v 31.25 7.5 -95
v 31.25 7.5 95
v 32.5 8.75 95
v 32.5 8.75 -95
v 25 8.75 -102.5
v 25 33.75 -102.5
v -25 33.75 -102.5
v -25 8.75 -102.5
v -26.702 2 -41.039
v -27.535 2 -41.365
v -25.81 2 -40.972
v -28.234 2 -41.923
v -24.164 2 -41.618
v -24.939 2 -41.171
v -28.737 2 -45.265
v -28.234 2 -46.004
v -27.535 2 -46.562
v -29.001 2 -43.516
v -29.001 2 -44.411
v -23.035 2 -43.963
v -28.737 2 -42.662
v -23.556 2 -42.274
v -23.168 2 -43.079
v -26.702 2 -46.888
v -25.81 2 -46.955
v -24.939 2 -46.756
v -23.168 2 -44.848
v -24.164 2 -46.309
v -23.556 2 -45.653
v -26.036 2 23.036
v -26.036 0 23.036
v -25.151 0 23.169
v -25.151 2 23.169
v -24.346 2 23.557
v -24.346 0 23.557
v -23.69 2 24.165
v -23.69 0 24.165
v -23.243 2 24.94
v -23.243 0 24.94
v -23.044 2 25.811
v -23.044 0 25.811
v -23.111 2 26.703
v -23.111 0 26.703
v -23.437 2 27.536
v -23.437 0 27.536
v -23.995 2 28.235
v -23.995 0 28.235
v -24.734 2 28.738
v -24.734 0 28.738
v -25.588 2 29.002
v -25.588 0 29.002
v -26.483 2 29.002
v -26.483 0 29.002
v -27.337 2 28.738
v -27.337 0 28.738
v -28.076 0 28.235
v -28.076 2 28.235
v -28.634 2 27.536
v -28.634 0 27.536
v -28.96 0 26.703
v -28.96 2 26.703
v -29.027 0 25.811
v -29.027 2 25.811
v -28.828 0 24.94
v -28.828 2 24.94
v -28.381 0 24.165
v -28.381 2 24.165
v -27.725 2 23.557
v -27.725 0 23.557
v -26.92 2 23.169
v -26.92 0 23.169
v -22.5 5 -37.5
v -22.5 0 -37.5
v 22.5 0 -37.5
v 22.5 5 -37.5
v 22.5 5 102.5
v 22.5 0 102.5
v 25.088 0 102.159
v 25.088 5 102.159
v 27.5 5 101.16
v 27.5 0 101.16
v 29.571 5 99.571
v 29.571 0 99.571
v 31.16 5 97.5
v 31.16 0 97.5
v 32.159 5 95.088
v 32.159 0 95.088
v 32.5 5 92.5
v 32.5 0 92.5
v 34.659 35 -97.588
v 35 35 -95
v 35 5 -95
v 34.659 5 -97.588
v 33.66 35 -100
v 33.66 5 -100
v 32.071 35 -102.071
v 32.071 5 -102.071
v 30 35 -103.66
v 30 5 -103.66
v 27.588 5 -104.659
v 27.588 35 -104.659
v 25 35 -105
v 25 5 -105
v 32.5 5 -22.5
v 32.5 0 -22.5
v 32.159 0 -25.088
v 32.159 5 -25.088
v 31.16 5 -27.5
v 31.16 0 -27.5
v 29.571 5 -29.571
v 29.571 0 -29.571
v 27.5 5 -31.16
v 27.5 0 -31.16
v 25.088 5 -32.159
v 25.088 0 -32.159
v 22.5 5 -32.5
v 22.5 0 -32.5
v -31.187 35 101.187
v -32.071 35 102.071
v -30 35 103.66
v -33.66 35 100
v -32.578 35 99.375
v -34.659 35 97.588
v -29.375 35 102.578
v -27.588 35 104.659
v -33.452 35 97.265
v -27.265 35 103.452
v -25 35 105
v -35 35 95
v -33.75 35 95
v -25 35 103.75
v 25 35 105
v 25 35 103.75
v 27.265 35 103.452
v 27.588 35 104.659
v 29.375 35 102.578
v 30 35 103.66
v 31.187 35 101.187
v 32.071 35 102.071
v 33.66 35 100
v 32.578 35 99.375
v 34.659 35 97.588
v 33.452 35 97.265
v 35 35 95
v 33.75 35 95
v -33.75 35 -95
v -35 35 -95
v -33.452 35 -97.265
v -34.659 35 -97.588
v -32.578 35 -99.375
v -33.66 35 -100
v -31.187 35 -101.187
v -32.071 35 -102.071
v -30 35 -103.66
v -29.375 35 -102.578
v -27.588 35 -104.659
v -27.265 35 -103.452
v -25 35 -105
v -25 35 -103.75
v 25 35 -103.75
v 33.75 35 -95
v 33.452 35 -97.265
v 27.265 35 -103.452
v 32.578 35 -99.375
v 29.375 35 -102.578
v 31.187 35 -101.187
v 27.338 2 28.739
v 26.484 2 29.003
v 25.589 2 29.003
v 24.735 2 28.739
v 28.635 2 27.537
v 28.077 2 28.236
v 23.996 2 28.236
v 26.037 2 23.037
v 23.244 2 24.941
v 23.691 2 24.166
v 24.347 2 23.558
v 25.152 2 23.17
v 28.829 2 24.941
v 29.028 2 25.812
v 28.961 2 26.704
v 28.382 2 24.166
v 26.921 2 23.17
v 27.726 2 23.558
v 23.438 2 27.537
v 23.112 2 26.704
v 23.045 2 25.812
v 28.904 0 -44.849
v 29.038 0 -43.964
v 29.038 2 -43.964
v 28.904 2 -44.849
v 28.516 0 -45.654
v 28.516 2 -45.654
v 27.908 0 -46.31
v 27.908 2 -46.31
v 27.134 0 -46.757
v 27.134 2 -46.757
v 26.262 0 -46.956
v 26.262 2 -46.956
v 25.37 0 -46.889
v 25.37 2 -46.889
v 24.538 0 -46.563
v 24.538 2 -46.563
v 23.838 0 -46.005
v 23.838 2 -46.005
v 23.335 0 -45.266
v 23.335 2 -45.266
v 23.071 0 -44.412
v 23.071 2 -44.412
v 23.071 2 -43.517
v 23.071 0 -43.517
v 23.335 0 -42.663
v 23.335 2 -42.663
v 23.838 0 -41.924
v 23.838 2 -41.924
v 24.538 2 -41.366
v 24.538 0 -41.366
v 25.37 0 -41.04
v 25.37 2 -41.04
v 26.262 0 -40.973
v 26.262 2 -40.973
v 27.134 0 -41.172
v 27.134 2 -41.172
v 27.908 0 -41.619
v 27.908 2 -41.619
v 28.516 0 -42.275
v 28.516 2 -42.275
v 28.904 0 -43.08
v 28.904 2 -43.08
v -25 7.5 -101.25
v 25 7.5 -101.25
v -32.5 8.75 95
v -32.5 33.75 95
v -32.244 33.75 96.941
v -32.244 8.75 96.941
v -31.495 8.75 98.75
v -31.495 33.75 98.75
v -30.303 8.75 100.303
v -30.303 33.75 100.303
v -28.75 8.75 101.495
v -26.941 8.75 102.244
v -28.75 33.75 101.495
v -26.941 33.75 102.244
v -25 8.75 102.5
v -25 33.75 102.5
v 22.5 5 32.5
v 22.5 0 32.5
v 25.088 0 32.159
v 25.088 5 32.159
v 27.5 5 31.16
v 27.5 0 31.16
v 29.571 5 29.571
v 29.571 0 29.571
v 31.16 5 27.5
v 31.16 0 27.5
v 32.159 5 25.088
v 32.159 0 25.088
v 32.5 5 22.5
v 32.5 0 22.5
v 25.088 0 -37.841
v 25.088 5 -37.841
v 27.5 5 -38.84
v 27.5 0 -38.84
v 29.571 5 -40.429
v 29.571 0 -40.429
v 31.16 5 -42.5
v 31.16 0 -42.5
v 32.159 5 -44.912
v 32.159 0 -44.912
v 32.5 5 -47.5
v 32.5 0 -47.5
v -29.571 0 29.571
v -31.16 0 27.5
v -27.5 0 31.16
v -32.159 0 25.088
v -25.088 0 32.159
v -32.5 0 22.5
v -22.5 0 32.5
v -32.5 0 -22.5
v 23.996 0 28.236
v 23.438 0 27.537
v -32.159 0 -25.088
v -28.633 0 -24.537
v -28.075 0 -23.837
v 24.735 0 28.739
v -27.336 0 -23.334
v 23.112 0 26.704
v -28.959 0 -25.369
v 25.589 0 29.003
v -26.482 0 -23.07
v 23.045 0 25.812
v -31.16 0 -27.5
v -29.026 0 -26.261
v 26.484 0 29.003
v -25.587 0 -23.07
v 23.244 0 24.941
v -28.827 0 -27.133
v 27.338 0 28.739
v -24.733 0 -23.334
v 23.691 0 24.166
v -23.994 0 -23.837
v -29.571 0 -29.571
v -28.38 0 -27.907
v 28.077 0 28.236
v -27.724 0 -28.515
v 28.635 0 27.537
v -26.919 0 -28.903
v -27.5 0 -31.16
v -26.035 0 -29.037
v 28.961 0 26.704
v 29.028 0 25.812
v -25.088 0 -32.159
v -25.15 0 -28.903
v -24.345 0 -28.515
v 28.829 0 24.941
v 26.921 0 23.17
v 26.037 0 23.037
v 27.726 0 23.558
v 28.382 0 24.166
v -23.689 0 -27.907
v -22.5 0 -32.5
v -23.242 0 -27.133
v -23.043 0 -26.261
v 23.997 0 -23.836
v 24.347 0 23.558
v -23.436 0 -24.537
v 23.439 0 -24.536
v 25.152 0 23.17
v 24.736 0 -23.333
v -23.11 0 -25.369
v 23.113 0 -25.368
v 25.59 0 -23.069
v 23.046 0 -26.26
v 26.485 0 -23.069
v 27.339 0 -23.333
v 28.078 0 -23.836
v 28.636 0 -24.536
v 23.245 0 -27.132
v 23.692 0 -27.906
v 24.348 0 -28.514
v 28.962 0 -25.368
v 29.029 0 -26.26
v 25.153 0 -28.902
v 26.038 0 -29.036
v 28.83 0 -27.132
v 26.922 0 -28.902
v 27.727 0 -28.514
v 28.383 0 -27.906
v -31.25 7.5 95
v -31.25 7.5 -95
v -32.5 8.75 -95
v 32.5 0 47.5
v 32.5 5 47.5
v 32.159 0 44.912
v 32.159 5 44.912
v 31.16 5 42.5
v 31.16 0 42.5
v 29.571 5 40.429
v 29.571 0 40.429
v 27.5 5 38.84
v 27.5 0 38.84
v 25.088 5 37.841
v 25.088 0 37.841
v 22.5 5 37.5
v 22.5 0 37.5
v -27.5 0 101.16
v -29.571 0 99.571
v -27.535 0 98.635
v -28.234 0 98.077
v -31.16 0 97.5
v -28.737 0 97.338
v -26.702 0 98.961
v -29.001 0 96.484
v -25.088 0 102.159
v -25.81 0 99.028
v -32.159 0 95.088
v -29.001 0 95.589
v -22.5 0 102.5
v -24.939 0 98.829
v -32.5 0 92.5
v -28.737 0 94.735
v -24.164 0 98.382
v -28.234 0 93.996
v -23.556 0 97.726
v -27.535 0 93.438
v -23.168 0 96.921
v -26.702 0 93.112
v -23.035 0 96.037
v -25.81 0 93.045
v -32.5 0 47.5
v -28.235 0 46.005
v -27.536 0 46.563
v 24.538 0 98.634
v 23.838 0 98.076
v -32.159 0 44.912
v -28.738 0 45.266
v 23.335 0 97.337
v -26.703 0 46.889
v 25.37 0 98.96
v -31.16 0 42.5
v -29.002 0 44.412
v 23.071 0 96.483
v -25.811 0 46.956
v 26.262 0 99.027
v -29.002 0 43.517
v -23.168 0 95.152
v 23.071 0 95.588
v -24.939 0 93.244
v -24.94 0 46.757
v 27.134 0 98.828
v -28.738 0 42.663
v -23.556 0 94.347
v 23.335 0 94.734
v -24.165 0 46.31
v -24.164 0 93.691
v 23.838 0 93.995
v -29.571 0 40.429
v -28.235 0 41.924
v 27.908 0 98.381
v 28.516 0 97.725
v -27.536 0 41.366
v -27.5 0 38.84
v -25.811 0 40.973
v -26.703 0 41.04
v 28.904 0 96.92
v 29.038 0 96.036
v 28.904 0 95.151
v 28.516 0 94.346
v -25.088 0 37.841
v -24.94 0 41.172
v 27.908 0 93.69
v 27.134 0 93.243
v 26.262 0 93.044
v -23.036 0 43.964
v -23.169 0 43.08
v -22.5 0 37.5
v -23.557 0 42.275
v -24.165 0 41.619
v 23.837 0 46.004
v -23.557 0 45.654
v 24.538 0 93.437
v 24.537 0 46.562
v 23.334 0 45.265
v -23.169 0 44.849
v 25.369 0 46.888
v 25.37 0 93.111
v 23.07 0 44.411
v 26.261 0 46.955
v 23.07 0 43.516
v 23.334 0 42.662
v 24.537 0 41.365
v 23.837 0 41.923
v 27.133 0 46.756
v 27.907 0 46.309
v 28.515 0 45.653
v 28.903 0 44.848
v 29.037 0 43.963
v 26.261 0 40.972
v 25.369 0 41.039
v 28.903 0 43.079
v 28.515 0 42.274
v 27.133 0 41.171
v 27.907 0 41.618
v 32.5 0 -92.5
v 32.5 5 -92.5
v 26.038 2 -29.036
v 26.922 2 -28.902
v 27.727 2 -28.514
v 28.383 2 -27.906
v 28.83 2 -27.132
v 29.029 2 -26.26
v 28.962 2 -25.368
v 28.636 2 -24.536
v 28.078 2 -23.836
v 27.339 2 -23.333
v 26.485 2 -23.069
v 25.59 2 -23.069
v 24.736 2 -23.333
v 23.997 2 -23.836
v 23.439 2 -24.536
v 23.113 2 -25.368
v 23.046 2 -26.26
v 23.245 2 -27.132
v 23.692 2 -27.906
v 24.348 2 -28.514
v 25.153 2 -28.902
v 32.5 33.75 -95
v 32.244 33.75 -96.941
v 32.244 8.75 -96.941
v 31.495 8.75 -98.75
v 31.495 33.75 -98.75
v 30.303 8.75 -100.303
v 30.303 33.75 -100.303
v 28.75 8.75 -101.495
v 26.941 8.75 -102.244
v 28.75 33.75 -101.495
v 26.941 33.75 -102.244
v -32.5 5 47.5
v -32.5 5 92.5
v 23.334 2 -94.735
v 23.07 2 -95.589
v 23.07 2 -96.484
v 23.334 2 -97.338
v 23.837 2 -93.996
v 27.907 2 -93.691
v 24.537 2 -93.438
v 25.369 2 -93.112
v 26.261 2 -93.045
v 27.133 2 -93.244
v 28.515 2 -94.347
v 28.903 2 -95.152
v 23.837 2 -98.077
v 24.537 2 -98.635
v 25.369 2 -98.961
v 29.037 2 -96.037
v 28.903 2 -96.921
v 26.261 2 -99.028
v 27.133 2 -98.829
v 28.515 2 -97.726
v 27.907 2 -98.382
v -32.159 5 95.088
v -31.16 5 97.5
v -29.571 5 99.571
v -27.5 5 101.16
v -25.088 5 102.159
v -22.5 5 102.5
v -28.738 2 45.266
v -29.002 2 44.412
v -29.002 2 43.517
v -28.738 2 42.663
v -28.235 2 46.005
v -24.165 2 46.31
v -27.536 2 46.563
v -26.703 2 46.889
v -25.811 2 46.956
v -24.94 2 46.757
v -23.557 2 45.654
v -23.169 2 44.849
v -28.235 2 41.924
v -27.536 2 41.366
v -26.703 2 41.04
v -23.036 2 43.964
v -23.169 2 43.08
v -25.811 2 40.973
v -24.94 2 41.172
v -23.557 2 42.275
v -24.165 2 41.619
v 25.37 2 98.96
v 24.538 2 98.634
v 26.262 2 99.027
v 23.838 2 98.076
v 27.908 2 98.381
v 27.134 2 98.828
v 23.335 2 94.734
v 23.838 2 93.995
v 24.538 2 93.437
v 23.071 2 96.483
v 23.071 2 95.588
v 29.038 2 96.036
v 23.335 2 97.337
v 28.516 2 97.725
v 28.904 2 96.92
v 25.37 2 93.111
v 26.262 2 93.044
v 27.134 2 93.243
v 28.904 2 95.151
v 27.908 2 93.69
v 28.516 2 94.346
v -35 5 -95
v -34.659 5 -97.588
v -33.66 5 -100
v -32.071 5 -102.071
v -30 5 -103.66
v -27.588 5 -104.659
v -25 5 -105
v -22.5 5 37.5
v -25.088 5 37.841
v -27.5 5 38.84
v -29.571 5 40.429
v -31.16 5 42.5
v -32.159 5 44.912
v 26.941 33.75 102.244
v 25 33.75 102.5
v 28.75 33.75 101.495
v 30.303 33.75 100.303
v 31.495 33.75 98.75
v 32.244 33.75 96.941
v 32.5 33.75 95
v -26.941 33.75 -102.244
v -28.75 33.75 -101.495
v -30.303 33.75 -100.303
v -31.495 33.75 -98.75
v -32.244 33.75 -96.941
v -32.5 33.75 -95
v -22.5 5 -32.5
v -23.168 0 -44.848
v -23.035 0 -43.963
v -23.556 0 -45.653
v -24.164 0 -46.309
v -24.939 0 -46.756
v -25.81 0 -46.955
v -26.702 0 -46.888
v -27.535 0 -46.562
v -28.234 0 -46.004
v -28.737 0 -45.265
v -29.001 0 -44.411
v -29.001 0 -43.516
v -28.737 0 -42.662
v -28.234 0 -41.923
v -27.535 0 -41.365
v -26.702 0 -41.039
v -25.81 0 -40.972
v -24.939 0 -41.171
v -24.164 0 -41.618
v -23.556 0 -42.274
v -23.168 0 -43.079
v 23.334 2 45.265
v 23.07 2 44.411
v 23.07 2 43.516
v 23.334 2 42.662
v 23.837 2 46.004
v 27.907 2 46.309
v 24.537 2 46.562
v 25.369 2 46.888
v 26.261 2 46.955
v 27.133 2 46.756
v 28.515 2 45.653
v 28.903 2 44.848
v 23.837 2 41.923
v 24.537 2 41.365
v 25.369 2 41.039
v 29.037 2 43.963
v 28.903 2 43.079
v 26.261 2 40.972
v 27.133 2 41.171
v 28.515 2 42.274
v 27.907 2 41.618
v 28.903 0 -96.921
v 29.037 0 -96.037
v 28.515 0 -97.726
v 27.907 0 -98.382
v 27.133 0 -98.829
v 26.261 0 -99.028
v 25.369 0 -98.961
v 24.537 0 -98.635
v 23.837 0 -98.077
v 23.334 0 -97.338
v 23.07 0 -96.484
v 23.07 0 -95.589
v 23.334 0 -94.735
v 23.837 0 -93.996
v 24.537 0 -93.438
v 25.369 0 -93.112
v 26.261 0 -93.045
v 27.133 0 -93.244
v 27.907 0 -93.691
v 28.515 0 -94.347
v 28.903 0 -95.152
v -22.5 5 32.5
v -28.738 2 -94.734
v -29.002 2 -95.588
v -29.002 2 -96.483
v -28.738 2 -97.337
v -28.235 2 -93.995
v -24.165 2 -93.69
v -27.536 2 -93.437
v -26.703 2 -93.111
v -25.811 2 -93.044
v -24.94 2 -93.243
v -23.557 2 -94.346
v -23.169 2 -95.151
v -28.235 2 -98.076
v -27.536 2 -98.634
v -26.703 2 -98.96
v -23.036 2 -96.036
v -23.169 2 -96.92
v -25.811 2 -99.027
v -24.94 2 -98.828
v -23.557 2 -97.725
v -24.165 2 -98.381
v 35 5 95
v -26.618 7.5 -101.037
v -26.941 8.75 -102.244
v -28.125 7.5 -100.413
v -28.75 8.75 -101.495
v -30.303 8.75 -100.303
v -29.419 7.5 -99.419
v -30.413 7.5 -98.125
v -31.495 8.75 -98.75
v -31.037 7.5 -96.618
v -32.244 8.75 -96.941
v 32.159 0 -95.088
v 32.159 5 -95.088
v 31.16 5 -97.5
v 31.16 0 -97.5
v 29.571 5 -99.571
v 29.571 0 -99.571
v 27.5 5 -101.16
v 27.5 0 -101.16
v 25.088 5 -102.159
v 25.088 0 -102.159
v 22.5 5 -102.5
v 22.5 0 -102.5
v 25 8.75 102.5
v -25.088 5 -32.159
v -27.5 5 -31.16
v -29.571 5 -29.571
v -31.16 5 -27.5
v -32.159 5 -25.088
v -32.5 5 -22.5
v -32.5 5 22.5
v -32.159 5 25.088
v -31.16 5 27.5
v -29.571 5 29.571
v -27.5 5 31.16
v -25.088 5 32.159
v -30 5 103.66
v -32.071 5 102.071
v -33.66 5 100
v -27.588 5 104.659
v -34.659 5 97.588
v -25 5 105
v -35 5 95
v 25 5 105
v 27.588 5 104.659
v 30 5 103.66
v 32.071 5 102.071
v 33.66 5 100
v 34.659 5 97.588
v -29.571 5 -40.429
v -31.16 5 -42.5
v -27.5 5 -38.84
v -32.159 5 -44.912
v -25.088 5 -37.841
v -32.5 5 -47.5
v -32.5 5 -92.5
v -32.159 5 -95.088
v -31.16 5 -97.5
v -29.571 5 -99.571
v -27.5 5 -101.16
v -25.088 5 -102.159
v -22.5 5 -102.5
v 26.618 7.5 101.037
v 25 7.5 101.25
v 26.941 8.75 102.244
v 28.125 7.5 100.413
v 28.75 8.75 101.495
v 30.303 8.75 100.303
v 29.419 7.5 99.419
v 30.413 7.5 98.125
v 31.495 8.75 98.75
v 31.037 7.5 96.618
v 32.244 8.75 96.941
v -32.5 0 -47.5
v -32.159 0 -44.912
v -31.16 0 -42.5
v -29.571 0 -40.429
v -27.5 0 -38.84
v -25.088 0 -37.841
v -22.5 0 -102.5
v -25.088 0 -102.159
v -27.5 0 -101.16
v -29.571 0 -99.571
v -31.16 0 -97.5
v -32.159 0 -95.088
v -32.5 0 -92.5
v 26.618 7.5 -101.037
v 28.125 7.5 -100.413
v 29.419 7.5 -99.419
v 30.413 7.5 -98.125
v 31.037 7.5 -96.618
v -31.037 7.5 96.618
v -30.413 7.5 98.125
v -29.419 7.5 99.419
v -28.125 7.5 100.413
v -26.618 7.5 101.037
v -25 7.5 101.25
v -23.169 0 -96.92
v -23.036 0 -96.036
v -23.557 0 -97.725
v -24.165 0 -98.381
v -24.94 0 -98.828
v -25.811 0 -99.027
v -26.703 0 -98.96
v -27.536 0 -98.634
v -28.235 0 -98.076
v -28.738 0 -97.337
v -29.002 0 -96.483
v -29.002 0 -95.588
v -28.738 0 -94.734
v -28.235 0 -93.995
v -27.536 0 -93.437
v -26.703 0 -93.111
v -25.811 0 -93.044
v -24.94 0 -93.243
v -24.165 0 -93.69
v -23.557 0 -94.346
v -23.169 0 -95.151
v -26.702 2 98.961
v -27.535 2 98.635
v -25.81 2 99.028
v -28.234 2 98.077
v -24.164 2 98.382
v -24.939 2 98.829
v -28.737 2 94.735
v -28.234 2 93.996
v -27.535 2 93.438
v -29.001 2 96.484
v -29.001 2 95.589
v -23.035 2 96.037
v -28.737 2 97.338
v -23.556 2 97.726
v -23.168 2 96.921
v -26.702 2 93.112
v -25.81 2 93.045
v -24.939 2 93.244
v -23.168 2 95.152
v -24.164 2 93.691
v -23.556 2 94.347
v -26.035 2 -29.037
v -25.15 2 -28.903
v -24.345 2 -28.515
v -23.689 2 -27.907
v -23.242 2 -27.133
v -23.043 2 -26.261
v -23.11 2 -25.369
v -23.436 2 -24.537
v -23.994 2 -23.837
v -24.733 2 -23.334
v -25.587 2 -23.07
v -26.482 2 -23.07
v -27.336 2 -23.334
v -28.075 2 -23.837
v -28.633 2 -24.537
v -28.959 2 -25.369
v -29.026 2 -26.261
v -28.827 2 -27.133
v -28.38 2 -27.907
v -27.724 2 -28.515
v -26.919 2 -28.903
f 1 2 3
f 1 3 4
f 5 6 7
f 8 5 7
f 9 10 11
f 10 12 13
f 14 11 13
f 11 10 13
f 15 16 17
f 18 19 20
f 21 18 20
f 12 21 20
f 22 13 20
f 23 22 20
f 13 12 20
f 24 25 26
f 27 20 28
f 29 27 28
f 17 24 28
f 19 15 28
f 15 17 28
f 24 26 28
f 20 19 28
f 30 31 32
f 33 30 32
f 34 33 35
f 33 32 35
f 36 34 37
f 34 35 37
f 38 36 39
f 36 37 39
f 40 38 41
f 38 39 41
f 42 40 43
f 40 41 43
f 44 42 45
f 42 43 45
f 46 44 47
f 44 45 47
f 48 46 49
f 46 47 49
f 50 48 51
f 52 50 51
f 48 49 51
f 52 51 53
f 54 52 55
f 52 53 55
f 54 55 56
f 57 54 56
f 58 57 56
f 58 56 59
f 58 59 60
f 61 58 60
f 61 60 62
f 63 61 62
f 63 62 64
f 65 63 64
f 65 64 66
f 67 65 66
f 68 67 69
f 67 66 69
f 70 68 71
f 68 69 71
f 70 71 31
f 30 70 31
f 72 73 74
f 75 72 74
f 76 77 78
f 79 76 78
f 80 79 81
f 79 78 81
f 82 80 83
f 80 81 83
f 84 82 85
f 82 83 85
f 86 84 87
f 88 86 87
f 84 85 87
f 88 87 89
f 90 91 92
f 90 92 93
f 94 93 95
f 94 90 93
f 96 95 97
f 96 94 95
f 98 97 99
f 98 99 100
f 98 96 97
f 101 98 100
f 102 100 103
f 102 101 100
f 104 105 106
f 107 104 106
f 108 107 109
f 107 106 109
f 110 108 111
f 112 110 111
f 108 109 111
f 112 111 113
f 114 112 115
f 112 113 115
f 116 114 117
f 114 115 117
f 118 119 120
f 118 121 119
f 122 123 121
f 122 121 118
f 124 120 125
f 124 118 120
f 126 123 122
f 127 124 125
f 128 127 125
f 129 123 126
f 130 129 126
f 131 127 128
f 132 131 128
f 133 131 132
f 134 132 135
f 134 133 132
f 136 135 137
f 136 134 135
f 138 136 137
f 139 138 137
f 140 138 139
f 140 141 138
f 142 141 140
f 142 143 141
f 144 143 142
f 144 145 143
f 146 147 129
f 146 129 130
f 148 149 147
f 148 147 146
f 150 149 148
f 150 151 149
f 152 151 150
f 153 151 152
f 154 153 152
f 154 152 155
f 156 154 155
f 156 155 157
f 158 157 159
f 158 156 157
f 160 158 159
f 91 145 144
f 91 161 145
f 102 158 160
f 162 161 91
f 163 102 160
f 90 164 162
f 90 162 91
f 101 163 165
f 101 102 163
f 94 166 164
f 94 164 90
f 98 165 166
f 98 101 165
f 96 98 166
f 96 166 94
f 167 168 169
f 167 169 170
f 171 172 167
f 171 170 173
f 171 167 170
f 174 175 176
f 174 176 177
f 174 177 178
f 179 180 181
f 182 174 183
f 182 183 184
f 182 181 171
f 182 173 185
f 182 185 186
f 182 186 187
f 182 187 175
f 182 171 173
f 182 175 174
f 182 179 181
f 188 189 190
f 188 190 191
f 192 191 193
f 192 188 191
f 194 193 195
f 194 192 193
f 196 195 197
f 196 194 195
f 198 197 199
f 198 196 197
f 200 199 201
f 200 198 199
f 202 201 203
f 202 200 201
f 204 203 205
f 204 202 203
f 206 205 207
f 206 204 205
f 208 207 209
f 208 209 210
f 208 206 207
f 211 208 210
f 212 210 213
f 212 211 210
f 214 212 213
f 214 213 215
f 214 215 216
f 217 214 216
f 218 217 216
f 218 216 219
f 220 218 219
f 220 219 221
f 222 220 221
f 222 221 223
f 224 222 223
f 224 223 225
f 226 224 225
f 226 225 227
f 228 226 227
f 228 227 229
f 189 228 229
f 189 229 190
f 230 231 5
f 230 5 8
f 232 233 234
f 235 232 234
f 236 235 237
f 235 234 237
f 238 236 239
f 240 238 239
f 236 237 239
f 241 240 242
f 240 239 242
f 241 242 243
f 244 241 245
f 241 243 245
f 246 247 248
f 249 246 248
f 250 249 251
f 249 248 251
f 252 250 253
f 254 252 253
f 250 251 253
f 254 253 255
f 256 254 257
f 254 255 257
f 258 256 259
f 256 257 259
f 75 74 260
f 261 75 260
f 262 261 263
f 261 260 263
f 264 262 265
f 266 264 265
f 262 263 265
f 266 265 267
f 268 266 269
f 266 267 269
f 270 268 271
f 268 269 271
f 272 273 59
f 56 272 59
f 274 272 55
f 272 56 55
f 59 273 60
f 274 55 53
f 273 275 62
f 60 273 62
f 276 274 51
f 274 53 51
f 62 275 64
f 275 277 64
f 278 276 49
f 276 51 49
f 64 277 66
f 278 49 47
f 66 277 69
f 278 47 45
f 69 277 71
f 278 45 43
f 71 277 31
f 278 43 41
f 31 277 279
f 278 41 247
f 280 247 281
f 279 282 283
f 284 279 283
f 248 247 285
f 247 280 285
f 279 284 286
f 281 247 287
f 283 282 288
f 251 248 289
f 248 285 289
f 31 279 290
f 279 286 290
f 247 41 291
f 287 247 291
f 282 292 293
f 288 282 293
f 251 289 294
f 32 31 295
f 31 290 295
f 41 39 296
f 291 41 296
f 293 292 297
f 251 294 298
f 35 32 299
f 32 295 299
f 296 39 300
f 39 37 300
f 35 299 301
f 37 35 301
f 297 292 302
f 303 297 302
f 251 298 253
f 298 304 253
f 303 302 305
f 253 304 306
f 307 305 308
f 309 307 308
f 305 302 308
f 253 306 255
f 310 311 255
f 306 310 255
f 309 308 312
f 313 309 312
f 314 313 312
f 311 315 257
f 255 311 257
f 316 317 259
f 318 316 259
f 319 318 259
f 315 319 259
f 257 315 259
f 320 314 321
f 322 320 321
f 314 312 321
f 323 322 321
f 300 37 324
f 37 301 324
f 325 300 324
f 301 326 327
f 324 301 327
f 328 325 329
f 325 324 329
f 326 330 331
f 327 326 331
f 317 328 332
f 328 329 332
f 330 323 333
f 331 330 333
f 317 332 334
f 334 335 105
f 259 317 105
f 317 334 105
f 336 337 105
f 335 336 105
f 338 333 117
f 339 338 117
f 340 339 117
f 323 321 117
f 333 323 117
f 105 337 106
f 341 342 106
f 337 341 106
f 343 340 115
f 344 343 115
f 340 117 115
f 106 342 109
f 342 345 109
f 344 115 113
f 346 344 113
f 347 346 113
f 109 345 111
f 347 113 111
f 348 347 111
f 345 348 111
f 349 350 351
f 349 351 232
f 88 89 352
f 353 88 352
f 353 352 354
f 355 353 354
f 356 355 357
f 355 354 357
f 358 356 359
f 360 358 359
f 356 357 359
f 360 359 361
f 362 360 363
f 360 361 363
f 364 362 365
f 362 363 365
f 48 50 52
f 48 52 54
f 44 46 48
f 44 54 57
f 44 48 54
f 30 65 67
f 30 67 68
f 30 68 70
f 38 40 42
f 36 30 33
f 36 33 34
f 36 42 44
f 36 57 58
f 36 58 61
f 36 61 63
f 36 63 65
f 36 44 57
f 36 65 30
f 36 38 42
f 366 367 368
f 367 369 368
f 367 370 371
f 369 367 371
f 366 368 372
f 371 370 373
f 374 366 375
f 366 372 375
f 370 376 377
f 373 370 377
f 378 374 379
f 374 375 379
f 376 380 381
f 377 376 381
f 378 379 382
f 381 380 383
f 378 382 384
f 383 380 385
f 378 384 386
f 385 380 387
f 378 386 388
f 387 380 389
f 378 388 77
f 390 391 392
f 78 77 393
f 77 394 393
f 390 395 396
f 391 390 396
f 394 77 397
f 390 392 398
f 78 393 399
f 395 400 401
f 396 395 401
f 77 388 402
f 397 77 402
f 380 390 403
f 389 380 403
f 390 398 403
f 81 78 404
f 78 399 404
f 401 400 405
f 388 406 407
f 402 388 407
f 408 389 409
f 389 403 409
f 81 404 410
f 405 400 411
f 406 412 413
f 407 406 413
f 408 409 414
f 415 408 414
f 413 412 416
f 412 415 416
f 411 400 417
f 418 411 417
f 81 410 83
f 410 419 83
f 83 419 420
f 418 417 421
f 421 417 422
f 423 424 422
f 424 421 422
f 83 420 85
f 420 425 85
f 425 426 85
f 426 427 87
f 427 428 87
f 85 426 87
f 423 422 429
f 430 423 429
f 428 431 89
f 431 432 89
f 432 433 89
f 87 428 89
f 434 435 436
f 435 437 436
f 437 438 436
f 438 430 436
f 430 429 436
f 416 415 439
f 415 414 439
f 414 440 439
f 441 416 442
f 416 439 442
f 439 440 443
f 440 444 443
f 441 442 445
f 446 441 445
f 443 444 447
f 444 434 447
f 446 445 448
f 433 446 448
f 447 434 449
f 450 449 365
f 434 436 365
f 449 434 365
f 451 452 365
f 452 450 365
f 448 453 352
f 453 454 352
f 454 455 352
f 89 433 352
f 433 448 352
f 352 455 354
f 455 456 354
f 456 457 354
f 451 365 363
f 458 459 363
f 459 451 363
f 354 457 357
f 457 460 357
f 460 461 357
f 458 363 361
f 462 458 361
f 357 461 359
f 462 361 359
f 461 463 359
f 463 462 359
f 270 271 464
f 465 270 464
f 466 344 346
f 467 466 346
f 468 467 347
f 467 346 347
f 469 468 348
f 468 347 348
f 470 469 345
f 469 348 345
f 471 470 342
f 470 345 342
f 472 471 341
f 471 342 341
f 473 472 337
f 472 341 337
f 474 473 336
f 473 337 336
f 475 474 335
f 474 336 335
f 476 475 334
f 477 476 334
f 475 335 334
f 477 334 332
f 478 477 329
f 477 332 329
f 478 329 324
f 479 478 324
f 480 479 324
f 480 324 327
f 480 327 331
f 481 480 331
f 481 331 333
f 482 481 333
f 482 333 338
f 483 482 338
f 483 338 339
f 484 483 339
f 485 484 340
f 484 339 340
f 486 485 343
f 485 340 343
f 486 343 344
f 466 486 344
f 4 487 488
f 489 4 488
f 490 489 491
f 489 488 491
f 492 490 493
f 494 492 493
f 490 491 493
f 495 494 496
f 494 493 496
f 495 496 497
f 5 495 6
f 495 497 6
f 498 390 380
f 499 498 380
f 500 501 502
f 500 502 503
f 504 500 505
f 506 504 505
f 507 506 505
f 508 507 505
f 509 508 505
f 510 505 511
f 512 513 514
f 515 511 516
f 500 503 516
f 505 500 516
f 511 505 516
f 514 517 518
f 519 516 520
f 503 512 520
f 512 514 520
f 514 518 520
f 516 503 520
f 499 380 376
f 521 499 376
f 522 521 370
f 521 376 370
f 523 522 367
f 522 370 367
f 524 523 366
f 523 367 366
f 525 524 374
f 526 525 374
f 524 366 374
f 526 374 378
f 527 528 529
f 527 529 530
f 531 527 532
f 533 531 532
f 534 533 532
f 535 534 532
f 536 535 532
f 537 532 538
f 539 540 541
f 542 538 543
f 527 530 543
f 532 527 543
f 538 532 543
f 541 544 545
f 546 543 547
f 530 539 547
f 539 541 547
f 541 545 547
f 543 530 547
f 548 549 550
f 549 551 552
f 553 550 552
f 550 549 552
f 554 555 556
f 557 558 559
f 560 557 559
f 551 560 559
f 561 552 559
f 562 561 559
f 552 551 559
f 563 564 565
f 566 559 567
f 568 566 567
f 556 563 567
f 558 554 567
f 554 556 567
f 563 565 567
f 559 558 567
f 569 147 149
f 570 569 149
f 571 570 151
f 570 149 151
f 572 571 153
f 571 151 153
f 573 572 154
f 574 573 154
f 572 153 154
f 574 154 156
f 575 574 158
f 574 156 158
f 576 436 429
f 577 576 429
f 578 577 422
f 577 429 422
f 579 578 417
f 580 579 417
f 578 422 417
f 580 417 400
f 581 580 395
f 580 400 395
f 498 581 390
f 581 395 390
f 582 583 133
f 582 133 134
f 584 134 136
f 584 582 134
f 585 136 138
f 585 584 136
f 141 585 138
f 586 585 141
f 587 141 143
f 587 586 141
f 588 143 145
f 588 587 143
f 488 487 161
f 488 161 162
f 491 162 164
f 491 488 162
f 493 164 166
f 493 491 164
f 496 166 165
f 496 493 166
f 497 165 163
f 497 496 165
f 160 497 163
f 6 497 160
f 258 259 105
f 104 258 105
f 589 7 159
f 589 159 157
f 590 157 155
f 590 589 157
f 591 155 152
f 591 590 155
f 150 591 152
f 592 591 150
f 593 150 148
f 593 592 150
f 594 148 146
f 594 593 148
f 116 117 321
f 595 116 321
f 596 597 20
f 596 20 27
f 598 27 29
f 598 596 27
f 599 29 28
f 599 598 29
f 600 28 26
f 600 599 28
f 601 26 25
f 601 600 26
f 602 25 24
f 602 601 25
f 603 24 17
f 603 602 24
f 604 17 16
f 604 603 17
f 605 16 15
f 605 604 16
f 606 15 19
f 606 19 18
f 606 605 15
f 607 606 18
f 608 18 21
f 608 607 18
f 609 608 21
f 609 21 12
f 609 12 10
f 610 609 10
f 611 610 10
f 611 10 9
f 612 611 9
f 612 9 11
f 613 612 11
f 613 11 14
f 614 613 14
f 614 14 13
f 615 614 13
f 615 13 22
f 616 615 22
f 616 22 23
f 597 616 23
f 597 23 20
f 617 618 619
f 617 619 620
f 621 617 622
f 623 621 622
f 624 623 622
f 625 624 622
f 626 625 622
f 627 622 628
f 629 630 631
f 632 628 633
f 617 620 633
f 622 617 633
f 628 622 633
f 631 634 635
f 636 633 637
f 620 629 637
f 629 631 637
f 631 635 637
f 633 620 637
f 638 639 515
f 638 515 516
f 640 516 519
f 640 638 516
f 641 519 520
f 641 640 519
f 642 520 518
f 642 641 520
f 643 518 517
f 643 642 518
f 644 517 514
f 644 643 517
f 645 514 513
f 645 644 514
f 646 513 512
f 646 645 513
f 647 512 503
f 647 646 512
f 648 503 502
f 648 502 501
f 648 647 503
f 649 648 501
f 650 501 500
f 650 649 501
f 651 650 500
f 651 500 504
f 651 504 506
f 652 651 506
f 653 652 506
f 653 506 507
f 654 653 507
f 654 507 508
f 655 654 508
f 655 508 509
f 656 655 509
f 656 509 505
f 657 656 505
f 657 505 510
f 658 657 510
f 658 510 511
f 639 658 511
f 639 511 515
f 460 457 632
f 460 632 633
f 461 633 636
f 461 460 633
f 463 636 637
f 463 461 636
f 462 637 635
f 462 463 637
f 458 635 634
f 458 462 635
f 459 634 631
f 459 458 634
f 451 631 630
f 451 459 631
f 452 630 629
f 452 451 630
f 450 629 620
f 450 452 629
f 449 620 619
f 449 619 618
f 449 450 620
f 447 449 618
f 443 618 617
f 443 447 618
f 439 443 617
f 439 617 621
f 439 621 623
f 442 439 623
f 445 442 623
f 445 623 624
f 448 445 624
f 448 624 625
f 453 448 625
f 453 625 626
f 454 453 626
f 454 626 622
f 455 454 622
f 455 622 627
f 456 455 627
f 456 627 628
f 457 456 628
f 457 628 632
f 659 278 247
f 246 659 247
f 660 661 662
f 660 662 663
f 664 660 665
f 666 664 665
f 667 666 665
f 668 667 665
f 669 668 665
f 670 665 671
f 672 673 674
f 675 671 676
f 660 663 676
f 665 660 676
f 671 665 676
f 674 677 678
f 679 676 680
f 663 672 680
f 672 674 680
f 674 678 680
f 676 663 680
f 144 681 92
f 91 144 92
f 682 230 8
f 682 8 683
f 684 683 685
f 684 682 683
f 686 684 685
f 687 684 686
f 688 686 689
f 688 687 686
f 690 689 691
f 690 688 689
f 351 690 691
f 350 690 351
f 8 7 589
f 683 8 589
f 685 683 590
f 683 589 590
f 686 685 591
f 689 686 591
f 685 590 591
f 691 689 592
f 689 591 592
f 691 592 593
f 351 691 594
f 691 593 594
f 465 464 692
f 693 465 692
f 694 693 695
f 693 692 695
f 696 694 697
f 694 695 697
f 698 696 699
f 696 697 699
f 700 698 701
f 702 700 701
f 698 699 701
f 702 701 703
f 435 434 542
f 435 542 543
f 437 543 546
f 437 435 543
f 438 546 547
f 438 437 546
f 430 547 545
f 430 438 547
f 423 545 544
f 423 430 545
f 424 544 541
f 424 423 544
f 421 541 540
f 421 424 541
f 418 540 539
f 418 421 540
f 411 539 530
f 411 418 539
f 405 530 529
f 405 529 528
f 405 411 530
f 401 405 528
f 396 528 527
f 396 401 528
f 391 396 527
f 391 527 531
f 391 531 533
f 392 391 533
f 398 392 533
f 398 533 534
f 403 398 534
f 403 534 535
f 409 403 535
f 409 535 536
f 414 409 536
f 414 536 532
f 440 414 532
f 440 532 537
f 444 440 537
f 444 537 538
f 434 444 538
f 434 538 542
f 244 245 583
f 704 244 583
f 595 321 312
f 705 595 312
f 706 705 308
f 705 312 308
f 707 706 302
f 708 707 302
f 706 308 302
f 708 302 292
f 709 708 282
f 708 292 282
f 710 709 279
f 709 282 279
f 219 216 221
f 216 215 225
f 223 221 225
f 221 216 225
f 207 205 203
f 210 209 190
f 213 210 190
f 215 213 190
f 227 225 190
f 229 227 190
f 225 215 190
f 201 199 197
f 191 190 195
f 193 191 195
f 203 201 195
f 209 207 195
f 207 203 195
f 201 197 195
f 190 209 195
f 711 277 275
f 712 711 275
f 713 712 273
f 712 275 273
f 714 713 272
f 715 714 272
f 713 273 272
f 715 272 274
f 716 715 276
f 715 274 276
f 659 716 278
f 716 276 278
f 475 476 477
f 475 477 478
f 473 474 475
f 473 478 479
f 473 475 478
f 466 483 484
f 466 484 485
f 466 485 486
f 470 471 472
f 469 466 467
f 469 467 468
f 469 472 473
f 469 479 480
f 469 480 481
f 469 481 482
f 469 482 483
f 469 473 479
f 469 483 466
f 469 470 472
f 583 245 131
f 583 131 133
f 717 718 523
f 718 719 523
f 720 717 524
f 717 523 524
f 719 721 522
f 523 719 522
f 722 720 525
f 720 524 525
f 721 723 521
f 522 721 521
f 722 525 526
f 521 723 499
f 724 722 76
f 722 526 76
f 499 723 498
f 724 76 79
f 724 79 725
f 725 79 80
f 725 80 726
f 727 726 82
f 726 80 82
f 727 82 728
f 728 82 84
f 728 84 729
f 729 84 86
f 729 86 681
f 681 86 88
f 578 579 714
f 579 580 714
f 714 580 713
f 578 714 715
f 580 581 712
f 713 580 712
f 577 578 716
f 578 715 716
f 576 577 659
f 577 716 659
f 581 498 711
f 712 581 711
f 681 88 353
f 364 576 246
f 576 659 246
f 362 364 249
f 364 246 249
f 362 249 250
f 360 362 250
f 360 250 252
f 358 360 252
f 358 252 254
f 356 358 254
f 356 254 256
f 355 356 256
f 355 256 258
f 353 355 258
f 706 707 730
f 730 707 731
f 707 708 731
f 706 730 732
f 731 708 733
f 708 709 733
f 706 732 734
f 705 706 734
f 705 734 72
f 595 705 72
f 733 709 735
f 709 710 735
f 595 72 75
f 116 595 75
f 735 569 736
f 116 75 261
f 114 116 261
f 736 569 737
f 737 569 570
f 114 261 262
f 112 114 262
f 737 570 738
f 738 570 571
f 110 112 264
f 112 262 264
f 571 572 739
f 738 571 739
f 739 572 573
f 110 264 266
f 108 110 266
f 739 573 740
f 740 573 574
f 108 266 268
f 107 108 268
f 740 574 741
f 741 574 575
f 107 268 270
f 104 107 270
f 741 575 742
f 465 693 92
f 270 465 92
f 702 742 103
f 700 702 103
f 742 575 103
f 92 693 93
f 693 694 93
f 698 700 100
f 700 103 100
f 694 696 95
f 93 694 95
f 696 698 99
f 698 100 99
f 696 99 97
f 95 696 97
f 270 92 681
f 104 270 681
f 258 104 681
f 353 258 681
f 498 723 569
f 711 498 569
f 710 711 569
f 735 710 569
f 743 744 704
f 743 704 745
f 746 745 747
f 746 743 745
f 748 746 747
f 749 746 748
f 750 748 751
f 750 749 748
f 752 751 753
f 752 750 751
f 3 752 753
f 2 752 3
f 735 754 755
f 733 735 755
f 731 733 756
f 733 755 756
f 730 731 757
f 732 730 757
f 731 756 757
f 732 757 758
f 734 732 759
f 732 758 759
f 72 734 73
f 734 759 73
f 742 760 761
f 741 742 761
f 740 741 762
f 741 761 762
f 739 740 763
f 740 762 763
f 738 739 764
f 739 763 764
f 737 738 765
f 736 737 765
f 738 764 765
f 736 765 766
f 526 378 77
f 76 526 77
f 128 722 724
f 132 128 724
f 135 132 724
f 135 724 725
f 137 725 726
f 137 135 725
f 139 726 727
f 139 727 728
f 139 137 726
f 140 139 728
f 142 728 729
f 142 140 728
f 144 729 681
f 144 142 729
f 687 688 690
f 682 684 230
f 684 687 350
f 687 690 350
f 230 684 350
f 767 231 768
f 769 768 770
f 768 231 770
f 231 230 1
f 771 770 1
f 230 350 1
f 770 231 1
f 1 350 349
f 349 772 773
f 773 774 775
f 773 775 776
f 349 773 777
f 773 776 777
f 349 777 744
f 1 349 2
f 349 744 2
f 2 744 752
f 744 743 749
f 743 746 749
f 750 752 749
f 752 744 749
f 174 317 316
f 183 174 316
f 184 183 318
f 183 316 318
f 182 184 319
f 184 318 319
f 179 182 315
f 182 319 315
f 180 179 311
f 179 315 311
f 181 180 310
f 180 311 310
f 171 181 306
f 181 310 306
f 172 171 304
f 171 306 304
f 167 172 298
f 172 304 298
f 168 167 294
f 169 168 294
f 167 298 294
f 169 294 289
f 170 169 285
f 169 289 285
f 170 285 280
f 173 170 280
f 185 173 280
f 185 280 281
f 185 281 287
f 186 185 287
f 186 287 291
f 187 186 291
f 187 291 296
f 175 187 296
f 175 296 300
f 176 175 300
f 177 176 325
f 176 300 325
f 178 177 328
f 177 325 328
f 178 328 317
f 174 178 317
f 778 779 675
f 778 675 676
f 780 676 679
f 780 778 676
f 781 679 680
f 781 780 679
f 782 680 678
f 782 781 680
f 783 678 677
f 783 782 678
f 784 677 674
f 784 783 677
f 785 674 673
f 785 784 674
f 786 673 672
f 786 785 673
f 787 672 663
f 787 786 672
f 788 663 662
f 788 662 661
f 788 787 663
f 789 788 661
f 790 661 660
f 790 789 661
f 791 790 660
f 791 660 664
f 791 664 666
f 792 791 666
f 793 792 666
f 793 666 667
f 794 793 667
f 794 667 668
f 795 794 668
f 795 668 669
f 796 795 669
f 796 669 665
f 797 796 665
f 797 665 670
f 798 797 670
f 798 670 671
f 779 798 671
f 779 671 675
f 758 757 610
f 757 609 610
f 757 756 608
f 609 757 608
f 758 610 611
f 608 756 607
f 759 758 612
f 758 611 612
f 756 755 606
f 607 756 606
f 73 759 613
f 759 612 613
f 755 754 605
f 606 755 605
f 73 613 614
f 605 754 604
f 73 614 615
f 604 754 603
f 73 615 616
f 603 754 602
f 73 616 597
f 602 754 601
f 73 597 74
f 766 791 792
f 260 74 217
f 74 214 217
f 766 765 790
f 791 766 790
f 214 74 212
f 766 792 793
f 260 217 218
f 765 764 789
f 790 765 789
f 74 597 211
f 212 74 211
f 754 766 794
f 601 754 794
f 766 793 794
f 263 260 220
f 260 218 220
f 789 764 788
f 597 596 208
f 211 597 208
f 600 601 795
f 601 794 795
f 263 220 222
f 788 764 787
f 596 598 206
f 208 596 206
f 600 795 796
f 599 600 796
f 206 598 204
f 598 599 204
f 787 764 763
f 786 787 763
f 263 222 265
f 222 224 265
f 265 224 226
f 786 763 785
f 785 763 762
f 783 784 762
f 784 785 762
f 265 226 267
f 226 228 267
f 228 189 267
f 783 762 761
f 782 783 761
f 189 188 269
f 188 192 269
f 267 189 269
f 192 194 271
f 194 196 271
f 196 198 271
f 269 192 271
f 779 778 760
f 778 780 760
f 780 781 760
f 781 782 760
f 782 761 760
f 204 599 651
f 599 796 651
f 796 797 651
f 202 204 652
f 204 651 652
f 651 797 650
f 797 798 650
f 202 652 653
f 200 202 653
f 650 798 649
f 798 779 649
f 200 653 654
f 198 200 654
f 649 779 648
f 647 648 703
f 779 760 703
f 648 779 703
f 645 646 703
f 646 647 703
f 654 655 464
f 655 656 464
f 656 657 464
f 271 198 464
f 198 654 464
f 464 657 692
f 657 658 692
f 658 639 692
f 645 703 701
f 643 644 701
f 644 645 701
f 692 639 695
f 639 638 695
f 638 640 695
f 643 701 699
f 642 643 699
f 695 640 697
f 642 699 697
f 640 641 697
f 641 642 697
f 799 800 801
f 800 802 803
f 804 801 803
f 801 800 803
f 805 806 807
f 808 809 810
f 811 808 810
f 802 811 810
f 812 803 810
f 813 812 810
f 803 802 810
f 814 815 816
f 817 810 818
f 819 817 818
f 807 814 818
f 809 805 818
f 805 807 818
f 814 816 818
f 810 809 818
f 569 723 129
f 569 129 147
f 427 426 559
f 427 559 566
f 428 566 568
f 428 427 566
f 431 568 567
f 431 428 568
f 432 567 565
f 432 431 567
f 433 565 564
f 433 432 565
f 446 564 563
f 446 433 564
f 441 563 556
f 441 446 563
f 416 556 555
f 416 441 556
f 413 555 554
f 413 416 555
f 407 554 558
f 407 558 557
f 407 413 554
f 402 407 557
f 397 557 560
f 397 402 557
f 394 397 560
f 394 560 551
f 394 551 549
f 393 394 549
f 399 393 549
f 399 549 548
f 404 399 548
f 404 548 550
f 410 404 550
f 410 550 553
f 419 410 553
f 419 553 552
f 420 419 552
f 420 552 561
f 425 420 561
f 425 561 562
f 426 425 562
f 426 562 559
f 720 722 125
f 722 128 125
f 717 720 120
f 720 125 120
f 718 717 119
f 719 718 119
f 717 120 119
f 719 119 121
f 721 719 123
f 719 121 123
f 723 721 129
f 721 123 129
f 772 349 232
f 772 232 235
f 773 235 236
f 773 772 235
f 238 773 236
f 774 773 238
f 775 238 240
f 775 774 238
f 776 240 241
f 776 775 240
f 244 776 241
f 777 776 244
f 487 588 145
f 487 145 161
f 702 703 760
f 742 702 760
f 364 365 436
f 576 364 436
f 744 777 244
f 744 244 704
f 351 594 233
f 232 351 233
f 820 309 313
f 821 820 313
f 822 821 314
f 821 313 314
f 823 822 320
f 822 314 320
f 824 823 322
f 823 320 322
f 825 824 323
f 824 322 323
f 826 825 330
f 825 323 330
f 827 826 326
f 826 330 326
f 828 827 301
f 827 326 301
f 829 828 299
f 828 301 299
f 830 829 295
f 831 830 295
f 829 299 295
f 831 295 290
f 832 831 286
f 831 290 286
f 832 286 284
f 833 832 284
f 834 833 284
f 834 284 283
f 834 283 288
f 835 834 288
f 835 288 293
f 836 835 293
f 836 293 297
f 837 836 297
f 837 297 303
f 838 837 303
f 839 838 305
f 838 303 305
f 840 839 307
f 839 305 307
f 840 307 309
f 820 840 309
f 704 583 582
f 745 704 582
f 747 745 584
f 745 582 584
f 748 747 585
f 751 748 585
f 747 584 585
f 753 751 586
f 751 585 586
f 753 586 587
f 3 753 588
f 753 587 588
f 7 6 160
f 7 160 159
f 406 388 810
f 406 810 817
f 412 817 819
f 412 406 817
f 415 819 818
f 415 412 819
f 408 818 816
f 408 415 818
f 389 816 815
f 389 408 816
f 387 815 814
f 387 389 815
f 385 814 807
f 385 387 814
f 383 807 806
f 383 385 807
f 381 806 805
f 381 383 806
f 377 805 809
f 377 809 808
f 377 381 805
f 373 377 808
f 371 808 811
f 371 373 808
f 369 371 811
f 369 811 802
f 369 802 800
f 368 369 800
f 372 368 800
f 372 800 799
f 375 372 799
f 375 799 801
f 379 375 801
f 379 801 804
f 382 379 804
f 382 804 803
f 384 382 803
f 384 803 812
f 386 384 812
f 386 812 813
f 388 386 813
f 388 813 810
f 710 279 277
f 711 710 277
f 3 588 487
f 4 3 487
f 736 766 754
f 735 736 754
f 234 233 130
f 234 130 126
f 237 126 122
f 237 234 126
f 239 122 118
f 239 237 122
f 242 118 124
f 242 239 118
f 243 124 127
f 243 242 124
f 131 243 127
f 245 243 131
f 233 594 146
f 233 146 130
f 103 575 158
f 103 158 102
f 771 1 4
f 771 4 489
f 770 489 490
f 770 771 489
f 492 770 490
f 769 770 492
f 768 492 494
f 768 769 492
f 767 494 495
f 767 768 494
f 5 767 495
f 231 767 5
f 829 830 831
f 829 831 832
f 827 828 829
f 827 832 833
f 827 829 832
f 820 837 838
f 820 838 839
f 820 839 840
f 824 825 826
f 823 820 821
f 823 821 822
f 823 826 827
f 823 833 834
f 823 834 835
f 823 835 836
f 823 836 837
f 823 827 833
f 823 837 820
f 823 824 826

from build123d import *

# Parameters (mm, degrees)
BOSS_EXTRUDE4_DEPTH = 5
SKETCH7_R           = 3
CUT_EXTRUDE4_DEPTH  = 2
SKETCH8_W           = 70
SKETCH8_H           = 70
BOSS_EXTRUDE5_DEPTH = 30
MIRROR2_START       = 5
MIRROR2_OUTLINE_W   = 70
MIRROR2_OUTLINE_H   = 70
MIRROR2_DEPTH       = 30
MIRROR2_2_OUTLINE_R = 3
MIRROR2_2_DEPTH     = 5
MIRROR2_START_2     = 2
MIRROR2_3_OUTLINE_R = 3
MIRROR2_3_DEPTH     = 3
FILLET1_R           = 10
CUT_EXTRUDE5_DEPTH  = 30
BOSS_EXTRUDE6_DEPTH = 2.5
CHAMFER1_SIZE       = 1.25


# Read off the part's stored shape, not the designer's step: Mirror2
with BuildPart() as part:
    # Sketch5 → Boss-Extrude4 (new body)
    with BuildSketch(Plane(origin=(0, 0, 0), x_dir=(1, 0, 0), z_dir=(0, 1, 0))):
        with BuildLine():
            Line((-22.5, -32.5), (22.5, -32.5))
            ThreePointArc((22.5, -32.5), (29.571067812, -29.571067812), (32.5, -22.5))
            Line((32.5, -22.5), (32.5, 22.5))
            ThreePointArc((32.5, 22.5), (29.571067812, 29.571067812), (22.5, 32.5))
            Line((22.5, 32.5), (-22.5, 32.5))
            ThreePointArc((-22.5, 32.5), (-29.571067812, 29.571067812), (-32.5, 22.5))
            Line((-32.5, 22.5), (-32.5, -22.5))
            ThreePointArc((-32.5, -22.5), (-29.571067812, -29.571067812), (-22.5, -32.5))
        make_face()
    extrude(amount=BOSS_EXTRUDE4_DEPTH)

    # Sketch7 → Cut-Extrude4 (cut)
    with BuildSketch(Plane.XZ):
        with Locations(Location((-26.035533906, 26.035533906, 0), (0, 0, 270))):
            Circle(SKETCH7_R)
        with Locations(Location((26.036533906, 26.036533906, 0), (0, 0, 270))):
            Circle(SKETCH7_R)
        with Locations(Location((26.037533906, -26.035533906, 0), (0, 0, 270))):
            Circle(SKETCH7_R)
        with Locations(Location((-26.034533906, -26.036533906, 0), (0, 0, 270))):
            Circle(SKETCH7_R)
    extrude(amount=-CUT_EXTRUDE4_DEPTH, mode=Mode.SUBTRACT)

    # Sketch8 → Boss-Extrude5 (add)
    with BuildSketch(Plane(origin=(0, 5, 0), x_dir=(1, 0, 0), z_dir=(0, 1, 0))):
        Rectangle(SKETCH8_W, SKETCH8_H)
    extrude(amount=BOSS_EXTRUDE5_DEPTH)

    # Mirror2 outline → Mirror2 (add)
    with BuildSketch(Plane(origin=(0, 0, 0), x_dir=(1, 0, 0), z_dir=(0, 1, 0)).offset(MIRROR2_START)):
        with Locations((0, -70)):
            Rectangle(MIRROR2_OUTLINE_W, MIRROR2_OUTLINE_H)
        with Locations((0, 70)):
            Rectangle(MIRROR2_OUTLINE_W, MIRROR2_OUTLINE_H)
    extrude(amount=MIRROR2_DEPTH)

    # Mirror2 2 outline → Mirror2 2 (add)
    # profile 1 of 2: a face of its own
    with BuildSketch(Plane(origin=(0, 0, 0), x_dir=(1, 0, 0), z_dir=(0, 1, 0))):
        with BuildLine():
            Line((32.5, -92.5), (32.5, -47.5))
            ThreePointArc((32.5, -47.5), (29.571067812, -40.428932188), (22.5, -37.5))
            Line((22.5, -37.5), (-22.5, -37.5))
            ThreePointArc((-22.5, -37.5), (-29.571067812, -40.428932188), (-32.5, -47.5))
            Line((-32.5, -47.5), (-32.5, -92.5))
            ThreePointArc((-32.5, -92.5), (-29.571067812, -99.571067812), (-22.5, -102.5))
            Line((-22.5, -102.5), (22.5, -102.5))
            ThreePointArc((22.5, -102.5), (29.571067812, -99.571067812), (32.5, -92.5))
        make_face()
        with Locations((-26.034533906, -96.036533906)):
            Circle(MIRROR2_2_OUTLINE_R, mode=Mode.SUBTRACT)
        with Locations((-26.035533906, -43.964466094)):
            Circle(MIRROR2_2_OUTLINE_R, mode=Mode.SUBTRACT)
        with Locations((26.037533906, -96.035533906)):
            Circle(MIRROR2_2_OUTLINE_R, mode=Mode.SUBTRACT)
        with Locations((26.036533906, -43.963466094)):
            Circle(MIRROR2_2_OUTLINE_R, mode=Mode.SUBTRACT)
    # profile 2 of 2: a face of its own
    with BuildSketch(Plane(origin=(0, 0, 0), x_dir=(1, 0, 0), z_dir=(0, 1, 0))):
        with BuildLine():
            Line((32.5, 47.5), (32.5, 92.5))
            ThreePointArc((32.5, 92.5), (29.571067812, 99.571067812), (22.5, 102.5))
            Line((22.5, 102.5), (-22.5, 102.5))
            ThreePointArc((-22.5, 102.5), (-29.571067812, 99.571067812), (-32.5, 92.5))
            Line((-32.5, 92.5), (-32.5, 47.5))
            ThreePointArc((-32.5, 47.5), (-29.571067812, 40.428932188), (-22.5, 37.5))
            Line((-22.5, 37.5), (22.5, 37.5))
            ThreePointArc((22.5, 37.5), (29.571067812, 40.428932188), (32.5, 47.5))
        make_face()
        with Locations((-26.034533906, 43.963466094)):
            Circle(MIRROR2_2_OUTLINE_R, mode=Mode.SUBTRACT)
        with Locations((-26.035533906, 96.035533906)):
            Circle(MIRROR2_2_OUTLINE_R, mode=Mode.SUBTRACT)
        with Locations((26.037533906, 43.964466094)):
            Circle(MIRROR2_2_OUTLINE_R, mode=Mode.SUBTRACT)
        with Locations((26.036533906, 96.036533906)):
            Circle(MIRROR2_2_OUTLINE_R, mode=Mode.SUBTRACT)
    extrude(amount=MIRROR2_2_DEPTH)

    # Mirror2 3 outline → Mirror2 3 (add)
    with BuildSketch(Plane(origin=(0, 0, 0), x_dir=(1, 0, 0), z_dir=(0, 1, 0)).offset(MIRROR2_START_2)):
        with Locations((-26.035533906, -43.964466094)):
            Circle(MIRROR2_3_OUTLINE_R)
        with Locations((26.036533906, -43.963466094)):
            Circle(MIRROR2_3_OUTLINE_R)
        with Locations((26.037533906, -96.035533906)):
            Circle(MIRROR2_3_OUTLINE_R)
        with Locations((-26.034533906, -96.036533906)):
            Circle(MIRROR2_3_OUTLINE_R)
        with Locations((-26.035533906, 96.035533906)):
            Circle(MIRROR2_3_OUTLINE_R)
        with Locations((26.036533906, 96.036533906)):
            Circle(MIRROR2_3_OUTLINE_R)
        with Locations((26.037533906, 43.964466094)):
            Circle(MIRROR2_3_OUTLINE_R)
        with Locations((-26.034533906, 43.963466094)):
            Circle(MIRROR2_3_OUTLINE_R)
    extrude(amount=MIRROR2_3_DEPTH)

    # Fillet1
    fillet1_edges = [part.edges().sort_by_distance(p)[0] for p in [
        (35, 20, 105),
        (-35, 20, 105),
        (-35, 20, -105),
        (35, 20, -105),
    ]]
    fillet(fillet1_edges, radius=FILLET1_R)

    # Sketch9 → Cut-Extrude5 (cut)
    with BuildSketch(Plane(origin=(0, 35, 0), x_dir=(1, 0, 0), z_dir=(0, 1, 0))):
        with BuildLine():
            Line((-32.5, 95), (-32.5, -95))
            ThreePointArc((-32.5, -95), (-30.303300859, -100.303300859), (-25, -102.5))
            Line((-25, -102.5), (25, -102.5))
            ThreePointArc((25, -102.5), (30.303300859, -100.303300859), (32.5, -95))
            Line((32.5, -95), (32.5, 95))
            ThreePointArc((32.5, 95), (30.303300859, 100.303300859), (25, 102.5))
            Line((25, 102.5), (-25, 102.5))
            ThreePointArc((-25, 102.5), (-30.303300859, 100.303300859), (-32.5, 95))
        make_face()
    extrude(amount=-CUT_EXTRUDE5_DEPTH, mode=Mode.SUBTRACT)


with BuildPart() as cut_extrude5_piece_1:
    # of the separate pieces the step leaves, piece 1, a body of its own (cut_extrude5_pieces)
    add(part.part.solids().sort_by_distance((35, 5, 95))[0])



with BuildPart() as cut_extrude5_piece_2:
    # of the separate pieces the step leaves, piece 2, a body of its own (cut_extrude5_pieces)
    add(part.part.solids().sort_by_distance((32.5, 0, 92.5))[0])


with BuildPart() as cut_extrude5_piece_3:
    # of the separate pieces the step leaves, piece 3, a body of its own (cut_extrude5_pieces)
    add(part.part.solids().sort_by_distance((32.5, 0, -47.5))[0])


with BuildPart() as cut_extrude5_piece_4:
    # of the separate pieces the step leaves, piece 4, a body of its own (cut_extrude5_pieces)
    add(part.part.solids().sort_by_distance((32.5, 0, 22.5))[0])


with BuildPart() as cut_extrude5_piece_1_1:
    add(cut_extrude5_piece_1.part)

    add(cut_extrude5_piece_2.part)  # Boss-Extrude6 merges Cut-Extrude5 piece 2

    add(cut_extrude5_piece_3.part)  # Boss-Extrude6 merges Cut-Extrude5 piece 3

    add(cut_extrude5_piece_4.part)  # Boss-Extrude6 merges Cut-Extrude5 piece 4
    # Sketch10 → Boss-Extrude6 (add)
    with BuildSketch(Plane.XZ.offset(-5)):
        with BuildLine():
            Line((25, 105), (-25, 105))
            ThreePointArc((-25, 105), (-32.071067812, 102.071067812), (-35, 95))
            Line((-35, 95), (-35, -95))
            ThreePointArc((-35, -95), (-32.071067812, -102.071067812), (-25, -105))
            Line((-25, -105), (25, -105))
            ThreePointArc((25, -105), (32.071067812, -102.071067812), (35, -95))
            Line((35, -95), (35, 95))
            ThreePointArc((35, 95), (32.071067812, 102.071067812), (25, 105))
        make_face()
    extrude(amount=-BOSS_EXTRUDE6_DEPTH)

    # Chamfer1
    chamfer1_edges = [cut_extrude5_piece_1_1.edges().sort_by_distance(p)[0] for p in [
        (0, 35, 102.5),
        (-32.5, 35, 0),
        (-30.303300859, 35, 100.303300859),
        (30.303300859, 35, 100.303300859),
        (30.303300859, 35, -100.303300859),
        (-30.303300859, 35, -100.303300859),
        (-30.303300859, 7.5, -100.303300859),
        (0, 7.5, 102.5),
        (30.303300859, 7.5, 100.303300859),
        (32.5, 7.5, 0),
        (30.303300859, 7.5, -100.303300859),
        (0, 7.5, -102.5),
        (-32.5, 7.5, 0),
        (-30.303300859, 7.5, 100.303300859),
        (0, 35, -102.5),
        (32.5, 35, 0),
    ]]
    chamfer(chamfer1_edges, length=CHAMFER1_SIZE)


solid = cut_extrude5_piece_1_1.part
